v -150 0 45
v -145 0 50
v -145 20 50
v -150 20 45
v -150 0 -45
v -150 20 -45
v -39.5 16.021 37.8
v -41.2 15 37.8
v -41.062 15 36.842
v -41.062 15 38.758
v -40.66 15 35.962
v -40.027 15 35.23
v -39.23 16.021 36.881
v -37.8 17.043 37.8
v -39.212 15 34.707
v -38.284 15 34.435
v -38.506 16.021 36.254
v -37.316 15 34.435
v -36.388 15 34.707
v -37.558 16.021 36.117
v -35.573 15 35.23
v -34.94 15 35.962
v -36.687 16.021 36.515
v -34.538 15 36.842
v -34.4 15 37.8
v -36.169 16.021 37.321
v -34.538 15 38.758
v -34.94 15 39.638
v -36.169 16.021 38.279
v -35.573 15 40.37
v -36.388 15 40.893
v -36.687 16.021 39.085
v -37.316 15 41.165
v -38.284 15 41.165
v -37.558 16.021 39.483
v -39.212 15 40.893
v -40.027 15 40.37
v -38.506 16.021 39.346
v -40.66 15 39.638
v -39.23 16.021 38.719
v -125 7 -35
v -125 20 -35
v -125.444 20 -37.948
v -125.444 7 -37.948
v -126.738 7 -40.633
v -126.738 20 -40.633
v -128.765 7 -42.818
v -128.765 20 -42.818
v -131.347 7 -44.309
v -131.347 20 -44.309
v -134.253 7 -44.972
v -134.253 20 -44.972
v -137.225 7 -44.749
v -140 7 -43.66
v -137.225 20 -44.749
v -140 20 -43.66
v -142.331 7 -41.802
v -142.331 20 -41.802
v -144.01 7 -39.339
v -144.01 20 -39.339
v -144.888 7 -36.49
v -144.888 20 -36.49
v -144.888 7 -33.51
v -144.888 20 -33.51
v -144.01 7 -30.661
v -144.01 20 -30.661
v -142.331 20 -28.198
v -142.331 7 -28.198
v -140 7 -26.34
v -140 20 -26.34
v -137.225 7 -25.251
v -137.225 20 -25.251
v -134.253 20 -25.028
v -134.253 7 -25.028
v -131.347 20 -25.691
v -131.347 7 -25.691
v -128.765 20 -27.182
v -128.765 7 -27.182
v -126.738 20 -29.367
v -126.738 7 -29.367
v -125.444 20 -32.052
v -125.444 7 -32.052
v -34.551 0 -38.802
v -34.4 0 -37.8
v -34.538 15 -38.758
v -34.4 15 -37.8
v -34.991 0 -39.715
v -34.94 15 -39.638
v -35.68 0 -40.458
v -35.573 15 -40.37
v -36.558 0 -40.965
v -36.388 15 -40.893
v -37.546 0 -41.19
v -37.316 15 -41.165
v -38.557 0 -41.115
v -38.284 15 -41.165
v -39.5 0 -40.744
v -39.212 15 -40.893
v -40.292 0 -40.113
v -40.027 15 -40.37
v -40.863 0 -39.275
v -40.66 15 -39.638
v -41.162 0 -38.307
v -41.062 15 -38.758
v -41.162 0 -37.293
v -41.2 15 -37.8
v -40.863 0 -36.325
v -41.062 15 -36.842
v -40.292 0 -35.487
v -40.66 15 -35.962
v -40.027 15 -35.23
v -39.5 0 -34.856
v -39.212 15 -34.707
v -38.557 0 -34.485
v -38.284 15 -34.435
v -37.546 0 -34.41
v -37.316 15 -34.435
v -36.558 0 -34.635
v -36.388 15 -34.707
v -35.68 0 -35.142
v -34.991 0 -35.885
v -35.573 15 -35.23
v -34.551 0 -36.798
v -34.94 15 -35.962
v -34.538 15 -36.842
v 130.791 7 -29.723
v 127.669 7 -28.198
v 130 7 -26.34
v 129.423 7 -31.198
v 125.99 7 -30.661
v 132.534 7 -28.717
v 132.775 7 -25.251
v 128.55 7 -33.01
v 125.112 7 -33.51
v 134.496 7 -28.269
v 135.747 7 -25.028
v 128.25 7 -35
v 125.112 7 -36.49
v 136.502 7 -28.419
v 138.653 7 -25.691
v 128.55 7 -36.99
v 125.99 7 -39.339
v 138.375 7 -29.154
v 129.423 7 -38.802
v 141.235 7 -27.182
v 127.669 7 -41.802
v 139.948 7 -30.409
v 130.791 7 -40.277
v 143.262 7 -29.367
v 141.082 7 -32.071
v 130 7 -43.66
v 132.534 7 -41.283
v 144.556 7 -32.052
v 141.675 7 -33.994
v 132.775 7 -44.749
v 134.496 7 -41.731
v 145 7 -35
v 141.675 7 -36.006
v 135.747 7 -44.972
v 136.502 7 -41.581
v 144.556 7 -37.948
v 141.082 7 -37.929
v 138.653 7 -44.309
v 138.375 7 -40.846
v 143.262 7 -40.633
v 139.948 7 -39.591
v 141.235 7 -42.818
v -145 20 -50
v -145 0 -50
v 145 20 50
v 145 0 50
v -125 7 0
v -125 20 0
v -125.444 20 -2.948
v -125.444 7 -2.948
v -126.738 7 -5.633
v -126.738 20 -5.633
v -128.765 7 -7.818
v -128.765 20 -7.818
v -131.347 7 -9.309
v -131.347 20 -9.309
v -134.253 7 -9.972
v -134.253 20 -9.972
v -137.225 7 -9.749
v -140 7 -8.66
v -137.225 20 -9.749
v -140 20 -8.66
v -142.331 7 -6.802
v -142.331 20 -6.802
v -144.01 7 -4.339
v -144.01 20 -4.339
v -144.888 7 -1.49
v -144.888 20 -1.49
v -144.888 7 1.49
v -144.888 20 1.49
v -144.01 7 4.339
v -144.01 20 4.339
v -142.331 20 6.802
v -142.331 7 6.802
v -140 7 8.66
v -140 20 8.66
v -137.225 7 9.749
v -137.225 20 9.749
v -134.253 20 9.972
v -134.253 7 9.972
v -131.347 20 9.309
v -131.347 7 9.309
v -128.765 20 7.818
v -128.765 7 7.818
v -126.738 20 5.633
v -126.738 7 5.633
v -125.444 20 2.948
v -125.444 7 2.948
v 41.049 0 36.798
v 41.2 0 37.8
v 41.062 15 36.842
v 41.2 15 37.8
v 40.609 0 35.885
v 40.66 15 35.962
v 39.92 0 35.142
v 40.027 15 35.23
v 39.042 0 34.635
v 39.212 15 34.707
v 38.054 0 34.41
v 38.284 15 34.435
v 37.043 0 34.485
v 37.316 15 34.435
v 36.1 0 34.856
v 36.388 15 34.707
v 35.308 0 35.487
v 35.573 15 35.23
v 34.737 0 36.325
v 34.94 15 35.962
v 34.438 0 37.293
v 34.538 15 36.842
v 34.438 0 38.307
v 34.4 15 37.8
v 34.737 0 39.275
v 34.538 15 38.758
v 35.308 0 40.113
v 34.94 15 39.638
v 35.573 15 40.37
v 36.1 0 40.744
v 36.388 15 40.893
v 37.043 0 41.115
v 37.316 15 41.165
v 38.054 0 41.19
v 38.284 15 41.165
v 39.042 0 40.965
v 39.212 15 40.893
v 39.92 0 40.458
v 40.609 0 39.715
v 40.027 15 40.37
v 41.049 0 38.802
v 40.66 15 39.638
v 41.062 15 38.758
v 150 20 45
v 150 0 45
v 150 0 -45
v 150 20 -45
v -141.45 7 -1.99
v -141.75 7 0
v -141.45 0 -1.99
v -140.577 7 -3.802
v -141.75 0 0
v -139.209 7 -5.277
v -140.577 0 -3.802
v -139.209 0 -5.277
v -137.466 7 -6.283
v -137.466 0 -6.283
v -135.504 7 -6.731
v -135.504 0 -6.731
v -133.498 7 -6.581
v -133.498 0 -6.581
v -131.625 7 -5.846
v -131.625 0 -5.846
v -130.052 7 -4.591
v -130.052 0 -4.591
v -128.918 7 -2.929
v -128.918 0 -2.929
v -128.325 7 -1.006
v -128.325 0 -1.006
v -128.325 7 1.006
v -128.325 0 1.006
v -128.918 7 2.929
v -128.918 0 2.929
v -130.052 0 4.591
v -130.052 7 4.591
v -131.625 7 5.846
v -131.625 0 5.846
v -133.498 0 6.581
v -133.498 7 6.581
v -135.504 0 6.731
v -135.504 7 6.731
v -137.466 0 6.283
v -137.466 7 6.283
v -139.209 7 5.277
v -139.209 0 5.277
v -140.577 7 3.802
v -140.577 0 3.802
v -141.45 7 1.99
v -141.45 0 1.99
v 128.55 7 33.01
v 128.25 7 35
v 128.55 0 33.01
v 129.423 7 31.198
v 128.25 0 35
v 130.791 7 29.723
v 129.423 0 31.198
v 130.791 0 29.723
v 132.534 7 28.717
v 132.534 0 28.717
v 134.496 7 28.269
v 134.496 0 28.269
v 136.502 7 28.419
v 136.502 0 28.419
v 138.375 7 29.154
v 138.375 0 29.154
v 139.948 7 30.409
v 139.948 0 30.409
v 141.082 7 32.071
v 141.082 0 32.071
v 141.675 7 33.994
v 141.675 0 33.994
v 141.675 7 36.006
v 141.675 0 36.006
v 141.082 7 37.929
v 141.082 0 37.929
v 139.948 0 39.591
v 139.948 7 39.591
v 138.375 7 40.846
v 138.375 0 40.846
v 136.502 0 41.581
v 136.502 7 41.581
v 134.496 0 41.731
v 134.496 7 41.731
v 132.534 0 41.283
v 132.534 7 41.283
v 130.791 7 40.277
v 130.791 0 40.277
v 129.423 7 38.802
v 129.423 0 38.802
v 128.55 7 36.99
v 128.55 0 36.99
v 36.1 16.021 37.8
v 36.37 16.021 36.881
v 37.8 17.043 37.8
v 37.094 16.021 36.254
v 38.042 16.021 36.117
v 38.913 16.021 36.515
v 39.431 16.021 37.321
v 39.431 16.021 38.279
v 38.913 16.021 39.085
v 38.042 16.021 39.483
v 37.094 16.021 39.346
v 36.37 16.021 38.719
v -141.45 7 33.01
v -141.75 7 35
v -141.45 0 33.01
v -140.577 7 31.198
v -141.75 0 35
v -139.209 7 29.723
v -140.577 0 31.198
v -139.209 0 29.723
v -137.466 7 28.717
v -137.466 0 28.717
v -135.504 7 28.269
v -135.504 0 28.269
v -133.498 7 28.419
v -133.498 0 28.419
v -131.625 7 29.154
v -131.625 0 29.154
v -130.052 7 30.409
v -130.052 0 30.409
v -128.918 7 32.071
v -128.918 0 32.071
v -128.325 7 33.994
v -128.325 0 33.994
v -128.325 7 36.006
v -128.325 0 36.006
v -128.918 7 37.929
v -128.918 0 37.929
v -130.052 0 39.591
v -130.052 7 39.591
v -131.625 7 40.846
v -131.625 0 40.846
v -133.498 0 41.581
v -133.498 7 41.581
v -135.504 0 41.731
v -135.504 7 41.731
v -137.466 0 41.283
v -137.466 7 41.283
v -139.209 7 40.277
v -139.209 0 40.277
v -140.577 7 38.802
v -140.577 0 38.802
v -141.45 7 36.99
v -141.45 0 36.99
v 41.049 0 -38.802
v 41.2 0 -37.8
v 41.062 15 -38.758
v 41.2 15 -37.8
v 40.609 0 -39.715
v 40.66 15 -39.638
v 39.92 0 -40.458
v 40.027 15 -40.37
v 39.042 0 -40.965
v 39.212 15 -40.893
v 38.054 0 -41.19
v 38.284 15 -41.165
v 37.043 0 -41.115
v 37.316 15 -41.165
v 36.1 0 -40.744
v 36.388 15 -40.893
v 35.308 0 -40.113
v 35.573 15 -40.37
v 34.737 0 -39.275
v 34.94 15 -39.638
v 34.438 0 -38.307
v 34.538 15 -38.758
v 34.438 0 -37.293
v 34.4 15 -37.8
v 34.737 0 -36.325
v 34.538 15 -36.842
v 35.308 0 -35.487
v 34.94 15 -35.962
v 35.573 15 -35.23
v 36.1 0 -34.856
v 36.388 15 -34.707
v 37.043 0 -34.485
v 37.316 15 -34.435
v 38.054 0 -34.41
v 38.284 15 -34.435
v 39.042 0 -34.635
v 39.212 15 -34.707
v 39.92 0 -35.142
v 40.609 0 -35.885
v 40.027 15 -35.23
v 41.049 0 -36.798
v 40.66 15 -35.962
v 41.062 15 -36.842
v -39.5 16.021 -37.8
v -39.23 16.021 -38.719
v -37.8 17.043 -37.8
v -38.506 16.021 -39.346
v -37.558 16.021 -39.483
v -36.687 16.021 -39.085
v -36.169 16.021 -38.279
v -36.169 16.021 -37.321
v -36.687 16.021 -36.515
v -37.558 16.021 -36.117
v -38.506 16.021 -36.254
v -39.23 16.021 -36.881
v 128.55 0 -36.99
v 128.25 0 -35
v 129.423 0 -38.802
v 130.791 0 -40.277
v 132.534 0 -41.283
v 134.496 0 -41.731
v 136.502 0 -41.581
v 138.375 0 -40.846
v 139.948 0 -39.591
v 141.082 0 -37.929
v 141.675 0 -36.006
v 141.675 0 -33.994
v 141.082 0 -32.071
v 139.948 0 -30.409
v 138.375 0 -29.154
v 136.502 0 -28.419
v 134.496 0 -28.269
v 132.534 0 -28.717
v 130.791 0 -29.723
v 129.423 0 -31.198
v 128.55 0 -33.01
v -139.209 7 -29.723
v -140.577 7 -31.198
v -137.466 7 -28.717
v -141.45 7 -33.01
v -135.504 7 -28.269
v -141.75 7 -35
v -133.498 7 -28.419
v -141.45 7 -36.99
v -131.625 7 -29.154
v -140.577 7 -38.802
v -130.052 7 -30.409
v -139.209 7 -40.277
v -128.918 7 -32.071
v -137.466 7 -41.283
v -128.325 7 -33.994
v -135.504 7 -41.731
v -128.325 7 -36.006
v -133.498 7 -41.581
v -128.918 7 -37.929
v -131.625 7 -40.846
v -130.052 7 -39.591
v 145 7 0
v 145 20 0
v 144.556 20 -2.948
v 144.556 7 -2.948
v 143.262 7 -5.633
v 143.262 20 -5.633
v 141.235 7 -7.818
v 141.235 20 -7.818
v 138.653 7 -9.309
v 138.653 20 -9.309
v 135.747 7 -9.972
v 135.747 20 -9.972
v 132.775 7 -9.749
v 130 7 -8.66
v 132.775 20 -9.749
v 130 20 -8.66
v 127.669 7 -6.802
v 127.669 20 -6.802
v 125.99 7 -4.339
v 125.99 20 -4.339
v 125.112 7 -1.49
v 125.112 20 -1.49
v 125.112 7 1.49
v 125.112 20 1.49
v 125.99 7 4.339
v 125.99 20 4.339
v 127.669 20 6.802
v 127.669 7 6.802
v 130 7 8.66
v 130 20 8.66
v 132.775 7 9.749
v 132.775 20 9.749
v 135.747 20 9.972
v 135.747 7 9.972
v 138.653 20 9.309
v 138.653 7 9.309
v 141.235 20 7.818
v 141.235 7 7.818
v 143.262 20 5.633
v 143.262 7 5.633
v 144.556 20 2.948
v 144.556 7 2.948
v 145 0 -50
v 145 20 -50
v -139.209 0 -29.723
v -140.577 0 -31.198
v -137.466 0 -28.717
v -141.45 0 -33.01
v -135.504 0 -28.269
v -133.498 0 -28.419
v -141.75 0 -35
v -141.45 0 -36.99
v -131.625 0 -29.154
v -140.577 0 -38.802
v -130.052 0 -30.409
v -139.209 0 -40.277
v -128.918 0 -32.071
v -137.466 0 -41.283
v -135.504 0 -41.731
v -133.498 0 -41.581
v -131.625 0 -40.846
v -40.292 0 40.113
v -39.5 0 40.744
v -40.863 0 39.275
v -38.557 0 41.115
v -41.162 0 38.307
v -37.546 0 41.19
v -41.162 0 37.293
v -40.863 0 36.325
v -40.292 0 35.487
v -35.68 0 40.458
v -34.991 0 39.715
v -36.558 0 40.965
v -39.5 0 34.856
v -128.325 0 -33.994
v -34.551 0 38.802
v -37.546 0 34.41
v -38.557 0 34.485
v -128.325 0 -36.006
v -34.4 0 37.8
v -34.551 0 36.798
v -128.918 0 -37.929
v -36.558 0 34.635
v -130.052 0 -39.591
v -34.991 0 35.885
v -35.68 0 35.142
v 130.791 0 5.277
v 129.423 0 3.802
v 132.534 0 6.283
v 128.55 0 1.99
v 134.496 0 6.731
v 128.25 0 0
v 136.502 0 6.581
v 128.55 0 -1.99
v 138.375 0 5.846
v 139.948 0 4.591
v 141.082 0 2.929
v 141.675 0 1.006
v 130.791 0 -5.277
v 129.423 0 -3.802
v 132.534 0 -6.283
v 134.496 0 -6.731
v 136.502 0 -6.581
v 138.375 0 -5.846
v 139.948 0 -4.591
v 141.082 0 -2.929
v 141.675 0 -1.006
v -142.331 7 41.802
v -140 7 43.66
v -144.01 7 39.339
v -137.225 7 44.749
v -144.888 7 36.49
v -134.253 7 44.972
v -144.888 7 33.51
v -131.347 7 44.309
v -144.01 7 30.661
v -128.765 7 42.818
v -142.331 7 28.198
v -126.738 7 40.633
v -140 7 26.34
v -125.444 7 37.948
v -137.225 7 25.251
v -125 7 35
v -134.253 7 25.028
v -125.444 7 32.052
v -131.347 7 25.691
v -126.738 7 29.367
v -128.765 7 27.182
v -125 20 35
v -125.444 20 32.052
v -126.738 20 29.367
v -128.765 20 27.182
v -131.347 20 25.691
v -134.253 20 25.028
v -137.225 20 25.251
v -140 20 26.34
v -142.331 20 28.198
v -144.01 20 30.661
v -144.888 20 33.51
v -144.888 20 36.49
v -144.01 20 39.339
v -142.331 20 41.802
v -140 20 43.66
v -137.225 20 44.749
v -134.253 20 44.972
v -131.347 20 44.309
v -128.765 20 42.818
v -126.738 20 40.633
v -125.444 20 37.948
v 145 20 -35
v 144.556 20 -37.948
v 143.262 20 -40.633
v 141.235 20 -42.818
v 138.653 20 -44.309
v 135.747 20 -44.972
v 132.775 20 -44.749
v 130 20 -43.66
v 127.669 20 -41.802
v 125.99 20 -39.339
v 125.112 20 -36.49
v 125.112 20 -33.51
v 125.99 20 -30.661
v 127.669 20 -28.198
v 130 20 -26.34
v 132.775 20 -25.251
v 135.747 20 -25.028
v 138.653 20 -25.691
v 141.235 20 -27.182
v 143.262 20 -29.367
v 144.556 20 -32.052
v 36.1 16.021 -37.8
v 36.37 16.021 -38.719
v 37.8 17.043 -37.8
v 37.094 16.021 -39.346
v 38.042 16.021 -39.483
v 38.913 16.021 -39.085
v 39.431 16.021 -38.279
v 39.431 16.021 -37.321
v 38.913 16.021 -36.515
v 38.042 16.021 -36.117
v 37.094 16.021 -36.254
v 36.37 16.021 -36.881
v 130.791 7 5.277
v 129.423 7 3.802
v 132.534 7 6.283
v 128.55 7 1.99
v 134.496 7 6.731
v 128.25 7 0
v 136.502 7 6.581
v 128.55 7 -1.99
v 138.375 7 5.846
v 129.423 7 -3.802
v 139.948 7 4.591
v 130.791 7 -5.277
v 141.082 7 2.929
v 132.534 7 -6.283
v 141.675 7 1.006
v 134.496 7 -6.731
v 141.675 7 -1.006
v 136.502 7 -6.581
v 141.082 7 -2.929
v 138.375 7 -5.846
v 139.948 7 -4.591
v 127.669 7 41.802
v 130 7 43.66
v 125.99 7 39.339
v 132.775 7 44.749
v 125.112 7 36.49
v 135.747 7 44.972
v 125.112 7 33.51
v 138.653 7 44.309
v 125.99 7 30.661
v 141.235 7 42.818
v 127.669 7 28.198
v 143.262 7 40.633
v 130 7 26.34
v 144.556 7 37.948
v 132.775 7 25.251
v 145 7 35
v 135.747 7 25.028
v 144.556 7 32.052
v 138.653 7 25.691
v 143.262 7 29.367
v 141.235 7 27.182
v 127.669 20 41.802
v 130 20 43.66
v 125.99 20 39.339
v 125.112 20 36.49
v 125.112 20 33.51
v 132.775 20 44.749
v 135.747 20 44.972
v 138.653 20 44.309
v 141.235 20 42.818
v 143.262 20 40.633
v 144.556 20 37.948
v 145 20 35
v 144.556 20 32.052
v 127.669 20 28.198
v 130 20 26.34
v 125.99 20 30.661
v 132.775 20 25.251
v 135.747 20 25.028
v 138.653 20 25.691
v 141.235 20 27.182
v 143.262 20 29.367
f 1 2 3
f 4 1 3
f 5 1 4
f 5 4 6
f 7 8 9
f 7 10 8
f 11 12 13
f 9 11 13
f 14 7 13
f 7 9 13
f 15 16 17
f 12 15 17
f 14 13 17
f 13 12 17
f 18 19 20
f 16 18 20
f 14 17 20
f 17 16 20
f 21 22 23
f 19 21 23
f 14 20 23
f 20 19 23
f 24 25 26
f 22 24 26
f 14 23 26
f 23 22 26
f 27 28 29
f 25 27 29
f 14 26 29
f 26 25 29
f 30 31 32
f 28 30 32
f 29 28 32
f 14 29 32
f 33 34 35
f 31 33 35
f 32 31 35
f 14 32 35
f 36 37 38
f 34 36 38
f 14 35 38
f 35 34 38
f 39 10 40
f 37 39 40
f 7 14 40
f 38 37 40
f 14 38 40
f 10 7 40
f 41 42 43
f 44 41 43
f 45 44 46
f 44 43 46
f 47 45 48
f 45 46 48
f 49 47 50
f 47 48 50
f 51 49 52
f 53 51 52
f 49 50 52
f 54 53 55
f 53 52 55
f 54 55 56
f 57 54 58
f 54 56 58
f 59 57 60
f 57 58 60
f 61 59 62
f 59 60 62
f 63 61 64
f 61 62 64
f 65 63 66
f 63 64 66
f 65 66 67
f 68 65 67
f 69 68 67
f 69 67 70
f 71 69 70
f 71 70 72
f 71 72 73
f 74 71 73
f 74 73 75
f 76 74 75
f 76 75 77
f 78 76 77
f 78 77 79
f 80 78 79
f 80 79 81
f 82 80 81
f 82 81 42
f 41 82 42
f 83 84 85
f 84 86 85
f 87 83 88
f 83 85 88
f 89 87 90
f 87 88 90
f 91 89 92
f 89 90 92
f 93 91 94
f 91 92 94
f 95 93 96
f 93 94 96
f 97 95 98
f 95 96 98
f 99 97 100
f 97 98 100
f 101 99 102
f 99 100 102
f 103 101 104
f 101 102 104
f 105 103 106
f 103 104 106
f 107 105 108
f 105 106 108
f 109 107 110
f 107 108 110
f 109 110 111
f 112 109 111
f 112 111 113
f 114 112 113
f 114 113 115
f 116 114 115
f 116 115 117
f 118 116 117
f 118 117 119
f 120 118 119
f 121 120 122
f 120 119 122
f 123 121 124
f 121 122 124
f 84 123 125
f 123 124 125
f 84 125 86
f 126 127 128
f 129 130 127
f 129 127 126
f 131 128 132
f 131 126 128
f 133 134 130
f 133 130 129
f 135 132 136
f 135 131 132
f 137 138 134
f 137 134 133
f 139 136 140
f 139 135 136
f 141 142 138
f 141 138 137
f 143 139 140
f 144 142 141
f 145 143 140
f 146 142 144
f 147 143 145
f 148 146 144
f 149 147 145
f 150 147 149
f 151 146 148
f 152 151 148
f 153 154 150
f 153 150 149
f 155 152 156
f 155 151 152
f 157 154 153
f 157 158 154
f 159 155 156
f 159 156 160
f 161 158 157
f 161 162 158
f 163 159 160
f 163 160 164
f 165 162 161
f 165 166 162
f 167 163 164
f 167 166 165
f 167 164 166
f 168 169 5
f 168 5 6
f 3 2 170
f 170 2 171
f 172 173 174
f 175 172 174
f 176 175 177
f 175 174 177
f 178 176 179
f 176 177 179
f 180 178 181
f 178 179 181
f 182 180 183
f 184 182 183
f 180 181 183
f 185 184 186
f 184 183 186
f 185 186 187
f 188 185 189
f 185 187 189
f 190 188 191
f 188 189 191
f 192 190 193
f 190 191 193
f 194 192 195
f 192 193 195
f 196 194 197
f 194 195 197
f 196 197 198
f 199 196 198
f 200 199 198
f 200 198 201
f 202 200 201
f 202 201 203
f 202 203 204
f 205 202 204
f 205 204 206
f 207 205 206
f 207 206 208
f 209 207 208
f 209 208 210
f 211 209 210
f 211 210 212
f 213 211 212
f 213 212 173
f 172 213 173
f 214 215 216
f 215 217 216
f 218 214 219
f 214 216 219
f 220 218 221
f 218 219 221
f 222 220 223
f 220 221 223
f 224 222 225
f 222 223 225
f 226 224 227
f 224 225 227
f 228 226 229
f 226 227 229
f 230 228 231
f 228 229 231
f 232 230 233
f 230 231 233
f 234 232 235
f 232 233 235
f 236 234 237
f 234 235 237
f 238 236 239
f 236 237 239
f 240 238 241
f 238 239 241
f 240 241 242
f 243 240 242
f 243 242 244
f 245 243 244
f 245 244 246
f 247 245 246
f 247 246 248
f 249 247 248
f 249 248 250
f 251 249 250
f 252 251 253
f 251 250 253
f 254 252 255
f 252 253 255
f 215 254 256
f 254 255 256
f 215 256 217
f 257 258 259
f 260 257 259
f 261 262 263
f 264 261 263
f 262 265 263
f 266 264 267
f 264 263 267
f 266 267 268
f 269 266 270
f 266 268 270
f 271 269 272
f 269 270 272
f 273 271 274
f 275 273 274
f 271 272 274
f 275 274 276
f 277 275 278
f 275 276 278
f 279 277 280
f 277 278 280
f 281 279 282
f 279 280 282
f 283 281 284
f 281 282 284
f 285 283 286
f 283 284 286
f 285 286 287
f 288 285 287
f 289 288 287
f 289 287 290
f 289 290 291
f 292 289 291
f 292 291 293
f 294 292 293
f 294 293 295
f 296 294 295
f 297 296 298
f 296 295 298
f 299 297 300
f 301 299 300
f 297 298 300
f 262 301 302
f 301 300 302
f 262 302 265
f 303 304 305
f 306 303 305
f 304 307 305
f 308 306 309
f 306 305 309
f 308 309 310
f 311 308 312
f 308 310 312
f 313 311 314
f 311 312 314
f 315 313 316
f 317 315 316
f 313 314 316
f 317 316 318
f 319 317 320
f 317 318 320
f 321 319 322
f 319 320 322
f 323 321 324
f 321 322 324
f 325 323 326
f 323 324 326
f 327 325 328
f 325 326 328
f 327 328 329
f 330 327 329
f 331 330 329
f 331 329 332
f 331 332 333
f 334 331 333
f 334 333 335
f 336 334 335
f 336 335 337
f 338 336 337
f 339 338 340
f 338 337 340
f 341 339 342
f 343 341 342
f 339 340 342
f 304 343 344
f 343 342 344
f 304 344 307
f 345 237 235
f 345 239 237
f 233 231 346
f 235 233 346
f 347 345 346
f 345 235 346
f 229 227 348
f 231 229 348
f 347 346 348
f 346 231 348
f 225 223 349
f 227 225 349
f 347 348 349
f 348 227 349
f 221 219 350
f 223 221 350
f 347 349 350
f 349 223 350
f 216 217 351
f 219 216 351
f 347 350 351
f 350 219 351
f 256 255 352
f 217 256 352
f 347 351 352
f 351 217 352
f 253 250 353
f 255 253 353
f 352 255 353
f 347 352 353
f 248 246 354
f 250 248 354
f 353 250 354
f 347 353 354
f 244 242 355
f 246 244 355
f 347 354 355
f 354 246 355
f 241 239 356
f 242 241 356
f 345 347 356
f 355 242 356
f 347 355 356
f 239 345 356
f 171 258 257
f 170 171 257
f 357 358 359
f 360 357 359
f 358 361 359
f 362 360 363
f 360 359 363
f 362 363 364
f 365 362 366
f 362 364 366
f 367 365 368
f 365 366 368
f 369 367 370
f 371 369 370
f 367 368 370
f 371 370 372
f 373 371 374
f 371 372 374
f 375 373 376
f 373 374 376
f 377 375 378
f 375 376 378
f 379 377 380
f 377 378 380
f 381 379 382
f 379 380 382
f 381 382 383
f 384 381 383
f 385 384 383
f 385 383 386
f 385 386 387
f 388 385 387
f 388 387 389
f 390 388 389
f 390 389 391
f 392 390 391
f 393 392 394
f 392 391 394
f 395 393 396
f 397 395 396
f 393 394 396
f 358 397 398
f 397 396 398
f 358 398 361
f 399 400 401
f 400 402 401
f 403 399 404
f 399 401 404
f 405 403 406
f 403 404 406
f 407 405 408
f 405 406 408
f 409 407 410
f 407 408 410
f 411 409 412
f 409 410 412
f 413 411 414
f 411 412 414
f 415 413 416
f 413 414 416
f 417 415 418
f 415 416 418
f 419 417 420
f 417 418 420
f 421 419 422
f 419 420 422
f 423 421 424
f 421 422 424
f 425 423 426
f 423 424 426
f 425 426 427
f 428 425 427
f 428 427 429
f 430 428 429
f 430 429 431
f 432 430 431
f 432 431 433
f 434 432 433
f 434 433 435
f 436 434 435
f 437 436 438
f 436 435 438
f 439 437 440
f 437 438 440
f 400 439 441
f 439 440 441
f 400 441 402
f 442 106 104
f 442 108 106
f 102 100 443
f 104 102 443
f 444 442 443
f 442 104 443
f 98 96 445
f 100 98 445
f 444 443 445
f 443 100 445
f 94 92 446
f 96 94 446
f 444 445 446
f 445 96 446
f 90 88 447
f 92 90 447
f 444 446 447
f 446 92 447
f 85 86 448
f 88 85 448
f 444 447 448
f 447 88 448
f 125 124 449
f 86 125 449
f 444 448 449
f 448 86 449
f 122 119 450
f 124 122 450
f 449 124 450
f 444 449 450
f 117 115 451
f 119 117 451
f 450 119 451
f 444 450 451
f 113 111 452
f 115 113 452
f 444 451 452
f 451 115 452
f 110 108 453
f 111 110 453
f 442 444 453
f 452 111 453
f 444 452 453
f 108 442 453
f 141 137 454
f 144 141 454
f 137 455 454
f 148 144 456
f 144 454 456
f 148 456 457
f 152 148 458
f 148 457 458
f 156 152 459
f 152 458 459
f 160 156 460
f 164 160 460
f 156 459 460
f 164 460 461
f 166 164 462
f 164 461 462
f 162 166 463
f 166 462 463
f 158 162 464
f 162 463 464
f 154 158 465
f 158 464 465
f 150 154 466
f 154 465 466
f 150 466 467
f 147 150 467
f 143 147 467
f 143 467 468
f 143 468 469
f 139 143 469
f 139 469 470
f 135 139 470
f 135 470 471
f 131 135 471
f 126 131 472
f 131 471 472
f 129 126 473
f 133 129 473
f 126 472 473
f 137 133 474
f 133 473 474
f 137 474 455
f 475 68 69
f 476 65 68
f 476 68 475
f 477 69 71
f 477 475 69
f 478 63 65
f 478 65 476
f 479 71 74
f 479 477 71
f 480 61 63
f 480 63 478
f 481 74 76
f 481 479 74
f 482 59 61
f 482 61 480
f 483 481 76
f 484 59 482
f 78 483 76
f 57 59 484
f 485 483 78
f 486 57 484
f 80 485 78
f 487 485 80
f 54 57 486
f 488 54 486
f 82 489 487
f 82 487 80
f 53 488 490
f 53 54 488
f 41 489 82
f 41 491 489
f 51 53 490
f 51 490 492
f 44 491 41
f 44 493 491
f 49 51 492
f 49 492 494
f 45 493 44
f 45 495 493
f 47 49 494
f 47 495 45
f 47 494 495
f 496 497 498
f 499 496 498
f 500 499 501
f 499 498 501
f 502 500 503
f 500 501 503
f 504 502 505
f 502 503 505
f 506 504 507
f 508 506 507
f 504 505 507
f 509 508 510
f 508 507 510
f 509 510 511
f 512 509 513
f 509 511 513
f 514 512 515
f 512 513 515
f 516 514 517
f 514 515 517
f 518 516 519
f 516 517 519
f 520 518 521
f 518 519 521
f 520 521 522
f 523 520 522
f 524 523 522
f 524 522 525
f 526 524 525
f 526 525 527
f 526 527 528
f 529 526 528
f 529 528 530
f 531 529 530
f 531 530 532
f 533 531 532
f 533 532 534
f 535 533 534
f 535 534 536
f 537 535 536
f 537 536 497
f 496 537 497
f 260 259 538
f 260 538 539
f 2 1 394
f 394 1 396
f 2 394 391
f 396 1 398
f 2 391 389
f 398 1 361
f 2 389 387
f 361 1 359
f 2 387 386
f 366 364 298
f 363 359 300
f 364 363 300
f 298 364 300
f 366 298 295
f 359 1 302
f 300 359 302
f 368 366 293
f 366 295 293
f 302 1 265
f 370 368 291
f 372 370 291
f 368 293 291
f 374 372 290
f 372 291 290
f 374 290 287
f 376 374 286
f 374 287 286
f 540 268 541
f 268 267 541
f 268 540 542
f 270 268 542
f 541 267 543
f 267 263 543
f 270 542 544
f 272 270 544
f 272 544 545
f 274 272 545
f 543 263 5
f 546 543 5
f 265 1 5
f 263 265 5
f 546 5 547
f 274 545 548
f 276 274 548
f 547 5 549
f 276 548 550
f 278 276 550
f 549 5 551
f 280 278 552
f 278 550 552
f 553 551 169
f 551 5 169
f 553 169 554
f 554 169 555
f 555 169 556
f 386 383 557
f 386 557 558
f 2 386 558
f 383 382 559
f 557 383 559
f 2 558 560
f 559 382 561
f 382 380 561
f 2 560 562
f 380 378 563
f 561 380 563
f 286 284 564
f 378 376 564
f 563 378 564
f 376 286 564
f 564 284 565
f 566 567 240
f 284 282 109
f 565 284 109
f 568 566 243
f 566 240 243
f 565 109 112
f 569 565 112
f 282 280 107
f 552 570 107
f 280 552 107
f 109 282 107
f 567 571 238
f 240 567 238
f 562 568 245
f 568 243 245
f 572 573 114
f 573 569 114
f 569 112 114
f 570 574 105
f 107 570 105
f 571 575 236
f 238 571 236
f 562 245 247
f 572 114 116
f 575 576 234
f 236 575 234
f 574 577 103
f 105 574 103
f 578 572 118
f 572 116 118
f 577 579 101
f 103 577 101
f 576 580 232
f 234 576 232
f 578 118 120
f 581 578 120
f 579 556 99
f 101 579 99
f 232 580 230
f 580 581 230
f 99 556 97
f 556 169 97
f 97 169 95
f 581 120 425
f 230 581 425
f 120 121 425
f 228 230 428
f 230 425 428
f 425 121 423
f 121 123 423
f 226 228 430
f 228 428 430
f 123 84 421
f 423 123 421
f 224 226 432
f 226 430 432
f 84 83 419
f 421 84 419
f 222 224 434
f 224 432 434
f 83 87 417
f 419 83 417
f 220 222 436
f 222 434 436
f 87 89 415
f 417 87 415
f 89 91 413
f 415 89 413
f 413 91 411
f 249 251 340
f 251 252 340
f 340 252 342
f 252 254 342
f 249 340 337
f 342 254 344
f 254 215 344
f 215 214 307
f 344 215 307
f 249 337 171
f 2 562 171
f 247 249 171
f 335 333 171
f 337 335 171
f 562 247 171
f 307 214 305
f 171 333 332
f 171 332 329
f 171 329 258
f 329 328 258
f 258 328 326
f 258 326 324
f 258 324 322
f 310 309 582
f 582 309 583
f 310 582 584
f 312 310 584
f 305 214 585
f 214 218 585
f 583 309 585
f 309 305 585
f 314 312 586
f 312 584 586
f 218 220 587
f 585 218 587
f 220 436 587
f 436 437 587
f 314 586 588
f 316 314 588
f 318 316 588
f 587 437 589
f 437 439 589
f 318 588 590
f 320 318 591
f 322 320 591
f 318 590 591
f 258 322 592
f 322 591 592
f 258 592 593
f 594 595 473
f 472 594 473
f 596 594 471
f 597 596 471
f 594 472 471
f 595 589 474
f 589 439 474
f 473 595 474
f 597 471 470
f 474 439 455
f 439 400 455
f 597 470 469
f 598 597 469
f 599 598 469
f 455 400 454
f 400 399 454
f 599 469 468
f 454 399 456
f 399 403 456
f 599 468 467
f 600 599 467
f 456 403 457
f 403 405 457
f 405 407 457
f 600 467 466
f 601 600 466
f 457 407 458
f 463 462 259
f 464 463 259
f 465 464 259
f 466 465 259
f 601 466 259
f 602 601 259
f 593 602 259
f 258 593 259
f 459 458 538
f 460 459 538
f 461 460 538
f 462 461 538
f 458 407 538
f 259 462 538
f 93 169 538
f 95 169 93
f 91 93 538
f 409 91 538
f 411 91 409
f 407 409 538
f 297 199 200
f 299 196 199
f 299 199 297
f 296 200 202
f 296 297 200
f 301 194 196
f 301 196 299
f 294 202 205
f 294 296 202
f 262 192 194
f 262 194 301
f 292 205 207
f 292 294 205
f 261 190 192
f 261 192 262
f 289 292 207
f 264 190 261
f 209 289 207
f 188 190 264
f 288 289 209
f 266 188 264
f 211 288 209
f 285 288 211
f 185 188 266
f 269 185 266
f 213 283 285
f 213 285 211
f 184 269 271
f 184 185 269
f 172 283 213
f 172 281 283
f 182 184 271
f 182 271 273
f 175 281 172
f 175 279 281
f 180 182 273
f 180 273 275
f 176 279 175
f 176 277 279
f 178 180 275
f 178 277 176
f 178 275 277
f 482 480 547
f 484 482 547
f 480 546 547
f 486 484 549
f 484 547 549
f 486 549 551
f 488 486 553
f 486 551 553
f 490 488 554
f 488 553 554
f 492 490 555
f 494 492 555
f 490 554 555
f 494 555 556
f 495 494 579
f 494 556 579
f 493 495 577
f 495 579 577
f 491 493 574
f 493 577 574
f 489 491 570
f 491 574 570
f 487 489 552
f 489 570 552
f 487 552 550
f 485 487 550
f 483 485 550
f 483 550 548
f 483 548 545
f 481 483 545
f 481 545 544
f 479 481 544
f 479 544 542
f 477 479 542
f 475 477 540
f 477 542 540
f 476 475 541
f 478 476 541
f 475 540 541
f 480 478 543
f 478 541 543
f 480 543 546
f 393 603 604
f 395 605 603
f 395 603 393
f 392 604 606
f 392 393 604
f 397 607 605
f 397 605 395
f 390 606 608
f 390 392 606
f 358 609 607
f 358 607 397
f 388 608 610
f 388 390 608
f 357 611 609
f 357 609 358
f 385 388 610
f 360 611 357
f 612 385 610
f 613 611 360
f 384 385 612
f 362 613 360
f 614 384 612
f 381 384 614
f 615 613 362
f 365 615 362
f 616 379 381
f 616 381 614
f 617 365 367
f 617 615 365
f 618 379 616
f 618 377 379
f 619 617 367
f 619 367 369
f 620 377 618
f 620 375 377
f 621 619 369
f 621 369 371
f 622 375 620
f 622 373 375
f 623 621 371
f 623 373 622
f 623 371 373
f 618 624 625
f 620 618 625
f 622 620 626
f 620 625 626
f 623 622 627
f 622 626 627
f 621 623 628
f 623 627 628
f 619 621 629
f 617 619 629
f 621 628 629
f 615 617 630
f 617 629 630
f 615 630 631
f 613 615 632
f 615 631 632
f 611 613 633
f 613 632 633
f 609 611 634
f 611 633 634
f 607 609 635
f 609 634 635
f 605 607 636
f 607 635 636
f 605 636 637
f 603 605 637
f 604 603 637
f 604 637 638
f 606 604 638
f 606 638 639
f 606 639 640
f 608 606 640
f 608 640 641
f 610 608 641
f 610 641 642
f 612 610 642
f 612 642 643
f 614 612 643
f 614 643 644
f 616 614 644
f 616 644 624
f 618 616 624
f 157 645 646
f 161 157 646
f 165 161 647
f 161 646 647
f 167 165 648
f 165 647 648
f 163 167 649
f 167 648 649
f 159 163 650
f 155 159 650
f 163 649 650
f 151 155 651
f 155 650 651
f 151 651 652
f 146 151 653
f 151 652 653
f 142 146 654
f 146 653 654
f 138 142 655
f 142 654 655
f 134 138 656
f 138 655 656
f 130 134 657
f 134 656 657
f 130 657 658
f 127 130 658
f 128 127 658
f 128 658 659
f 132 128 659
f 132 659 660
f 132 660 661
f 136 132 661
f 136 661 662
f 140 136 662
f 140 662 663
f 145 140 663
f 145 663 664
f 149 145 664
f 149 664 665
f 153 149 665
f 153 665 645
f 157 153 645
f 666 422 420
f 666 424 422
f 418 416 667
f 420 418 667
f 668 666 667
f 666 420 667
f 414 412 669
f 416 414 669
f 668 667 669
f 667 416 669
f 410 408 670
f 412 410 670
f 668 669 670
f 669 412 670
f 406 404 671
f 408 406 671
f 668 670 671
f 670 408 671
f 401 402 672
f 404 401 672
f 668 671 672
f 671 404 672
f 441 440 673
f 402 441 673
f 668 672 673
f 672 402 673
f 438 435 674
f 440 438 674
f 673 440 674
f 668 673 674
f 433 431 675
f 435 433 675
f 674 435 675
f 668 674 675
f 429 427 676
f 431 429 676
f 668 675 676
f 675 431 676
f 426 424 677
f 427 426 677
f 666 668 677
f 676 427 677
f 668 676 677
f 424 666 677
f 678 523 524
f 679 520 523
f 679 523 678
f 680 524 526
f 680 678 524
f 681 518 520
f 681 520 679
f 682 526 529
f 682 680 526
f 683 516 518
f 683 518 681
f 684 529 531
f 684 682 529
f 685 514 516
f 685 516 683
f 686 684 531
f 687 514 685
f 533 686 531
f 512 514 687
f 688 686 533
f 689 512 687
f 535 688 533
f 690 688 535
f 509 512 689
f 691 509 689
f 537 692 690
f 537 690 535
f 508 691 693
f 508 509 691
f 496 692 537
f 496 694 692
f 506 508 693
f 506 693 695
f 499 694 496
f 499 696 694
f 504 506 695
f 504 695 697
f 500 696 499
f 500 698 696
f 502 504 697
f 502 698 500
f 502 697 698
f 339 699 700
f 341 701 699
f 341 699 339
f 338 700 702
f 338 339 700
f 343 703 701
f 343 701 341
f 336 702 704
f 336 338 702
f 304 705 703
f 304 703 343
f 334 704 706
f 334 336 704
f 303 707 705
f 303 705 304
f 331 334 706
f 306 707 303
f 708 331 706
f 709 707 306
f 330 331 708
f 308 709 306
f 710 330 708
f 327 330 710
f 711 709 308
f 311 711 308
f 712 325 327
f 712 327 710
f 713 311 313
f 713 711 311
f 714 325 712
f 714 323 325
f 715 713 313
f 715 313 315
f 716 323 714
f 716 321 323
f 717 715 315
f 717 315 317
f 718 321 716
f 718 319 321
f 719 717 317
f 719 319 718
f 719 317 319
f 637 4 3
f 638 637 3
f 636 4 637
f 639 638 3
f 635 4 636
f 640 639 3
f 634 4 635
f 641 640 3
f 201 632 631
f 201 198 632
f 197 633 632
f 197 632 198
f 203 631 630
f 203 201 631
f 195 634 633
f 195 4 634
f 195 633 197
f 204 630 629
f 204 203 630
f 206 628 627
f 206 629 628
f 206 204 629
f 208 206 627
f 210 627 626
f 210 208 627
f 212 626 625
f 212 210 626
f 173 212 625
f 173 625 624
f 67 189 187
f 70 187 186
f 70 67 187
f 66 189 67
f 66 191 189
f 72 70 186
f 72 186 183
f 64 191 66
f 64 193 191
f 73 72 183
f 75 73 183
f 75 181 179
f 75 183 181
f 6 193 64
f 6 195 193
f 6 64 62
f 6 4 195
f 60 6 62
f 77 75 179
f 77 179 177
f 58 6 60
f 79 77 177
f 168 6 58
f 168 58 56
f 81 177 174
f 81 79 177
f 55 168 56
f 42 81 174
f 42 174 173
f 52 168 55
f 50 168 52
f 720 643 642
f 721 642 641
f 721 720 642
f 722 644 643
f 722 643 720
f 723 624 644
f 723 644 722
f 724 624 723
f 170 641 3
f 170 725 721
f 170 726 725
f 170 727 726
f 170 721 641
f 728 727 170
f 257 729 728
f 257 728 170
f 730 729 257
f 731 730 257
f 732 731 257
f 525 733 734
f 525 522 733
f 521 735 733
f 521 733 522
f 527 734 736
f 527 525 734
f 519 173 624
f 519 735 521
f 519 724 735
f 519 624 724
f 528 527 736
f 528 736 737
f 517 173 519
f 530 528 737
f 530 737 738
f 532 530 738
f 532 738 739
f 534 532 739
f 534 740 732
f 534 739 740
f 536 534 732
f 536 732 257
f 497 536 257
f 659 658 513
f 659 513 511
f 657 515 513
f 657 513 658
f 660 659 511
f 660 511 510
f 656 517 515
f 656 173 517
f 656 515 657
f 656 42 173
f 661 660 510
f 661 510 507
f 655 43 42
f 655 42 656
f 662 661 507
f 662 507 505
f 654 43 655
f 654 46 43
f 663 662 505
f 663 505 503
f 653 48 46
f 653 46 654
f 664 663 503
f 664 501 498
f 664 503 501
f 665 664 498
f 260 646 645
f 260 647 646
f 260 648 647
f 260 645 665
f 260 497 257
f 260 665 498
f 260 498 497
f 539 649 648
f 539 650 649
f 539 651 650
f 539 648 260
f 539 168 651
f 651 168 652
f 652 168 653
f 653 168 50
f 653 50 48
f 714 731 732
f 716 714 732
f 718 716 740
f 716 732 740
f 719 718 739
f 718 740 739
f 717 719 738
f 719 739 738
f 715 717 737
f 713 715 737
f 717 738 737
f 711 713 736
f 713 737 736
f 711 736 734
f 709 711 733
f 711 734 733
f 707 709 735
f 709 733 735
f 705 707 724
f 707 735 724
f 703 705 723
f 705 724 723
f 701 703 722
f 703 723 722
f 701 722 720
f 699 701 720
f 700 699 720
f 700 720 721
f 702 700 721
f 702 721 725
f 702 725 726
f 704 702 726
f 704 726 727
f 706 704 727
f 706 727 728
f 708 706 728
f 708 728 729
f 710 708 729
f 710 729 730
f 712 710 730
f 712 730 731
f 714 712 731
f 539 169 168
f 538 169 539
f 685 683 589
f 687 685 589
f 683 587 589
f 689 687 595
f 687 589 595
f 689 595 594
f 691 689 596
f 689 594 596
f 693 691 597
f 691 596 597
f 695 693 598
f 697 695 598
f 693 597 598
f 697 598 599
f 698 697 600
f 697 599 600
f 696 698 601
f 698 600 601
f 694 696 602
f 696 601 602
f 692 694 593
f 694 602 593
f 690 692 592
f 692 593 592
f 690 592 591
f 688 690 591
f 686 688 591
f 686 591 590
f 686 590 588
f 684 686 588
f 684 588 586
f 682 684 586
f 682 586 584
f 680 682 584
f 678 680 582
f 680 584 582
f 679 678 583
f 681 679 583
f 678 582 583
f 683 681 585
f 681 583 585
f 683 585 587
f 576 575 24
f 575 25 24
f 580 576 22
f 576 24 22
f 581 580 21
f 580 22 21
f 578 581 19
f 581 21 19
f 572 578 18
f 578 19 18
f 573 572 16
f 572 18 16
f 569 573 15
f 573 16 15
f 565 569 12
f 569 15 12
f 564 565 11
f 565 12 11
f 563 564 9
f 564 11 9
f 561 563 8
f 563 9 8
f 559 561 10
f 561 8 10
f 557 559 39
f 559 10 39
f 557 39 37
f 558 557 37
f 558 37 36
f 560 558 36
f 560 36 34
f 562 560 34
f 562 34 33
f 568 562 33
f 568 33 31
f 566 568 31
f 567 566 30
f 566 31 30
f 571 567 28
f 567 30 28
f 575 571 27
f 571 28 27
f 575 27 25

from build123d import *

# Parameters (mm, degrees)
SKETCH1_W                                            = 300
SKETCH1_H                                            = 100
BOSS_EXTRUDE1_DEPTH                                  = 20
CBORE_FOR_M12_HEXAGON_SOCKET_HEAD_CAP_SC_D           = 13.5
CBORE_FOR_M12_HEXAGON_SOCKET_HEAD_CAP_SC_CBORE_D     = 20
CBORE_FOR_M12_HEXAGON_SOCKET_HEAD_CAP_SC_CBORE_DEPTH = 13
CHAMFER1_SIZE                                        = 5
M8_TAPPED_HOLE1_D                                    = 6.8
M8_TAPPED_HOLE1_DEPTH                                = 15
M8_TAPPED_HOLE1_TIP                                  = 2.042926105


with BuildPart() as part:
    # Sketch1 → Boss-Extrude1 (new body)
    with BuildSketch(Plane(origin=(0, 0, 0), x_dir=(1, 0, 0), z_dir=(0, 1, 0))):
        Rectangle(SKETCH1_W, SKETCH1_H)
    extrude(amount=BOSS_EXTRUDE1_DEPTH)

    # CBORE for M12 Hexagon socket head cap screws1 (through all)
    with Locations(Plane(origin=(0, 20, 0), x_dir=(1, 0, 0), z_dir=(0, 1, 0))):
        with Locations((-135, 35), (-135, -35), (-135, 0), (135, 0), (135, -35), (135, 35)):
            CounterBoreHole(CBORE_FOR_M12_HEXAGON_SOCKET_HEAD_CAP_SC_D / 2, CBORE_FOR_M12_HEXAGON_SOCKET_HEAD_CAP_SC_CBORE_D / 2, CBORE_FOR_M12_HEXAGON_SOCKET_HEAD_CAP_SC_CBORE_DEPTH)

    # Chamfer1
    chamfer1_edges = [part.edges().sort_by_distance(p)[0] for p in [
        (-150, 10, -50),
        (150, 10, -50),
        (150, 10, 50),
        (-150, 10, 50),
    ]]
    chamfer(chamfer1_edges, length=CHAMFER1_SIZE)

    # M8 Tapped Hole1
    with Locations(Plane(origin=(0, 0, 0), x_dir=(-1, 0, 0), z_dir=(0, -1, 0))):
        with Locations((-37.8, 37.8), (37.8, 37.8), (37.8, -37.8), (-37.8, -37.8)):
            Hole(M8_TAPPED_HOLE1_D / 2, depth=M8_TAPPED_HOLE1_DEPTH)
            with Locations((0, 0, -(M8_TAPPED_HOLE1_DEPTH + M8_TAPPED_HOLE1_TIP / 2))):  # 118° drill point
                Cone(0, M8_TAPPED_HOLE1_D / 2, M8_TAPPED_HOLE1_TIP, mode=Mode.SUBTRACT)


solid = part.part
